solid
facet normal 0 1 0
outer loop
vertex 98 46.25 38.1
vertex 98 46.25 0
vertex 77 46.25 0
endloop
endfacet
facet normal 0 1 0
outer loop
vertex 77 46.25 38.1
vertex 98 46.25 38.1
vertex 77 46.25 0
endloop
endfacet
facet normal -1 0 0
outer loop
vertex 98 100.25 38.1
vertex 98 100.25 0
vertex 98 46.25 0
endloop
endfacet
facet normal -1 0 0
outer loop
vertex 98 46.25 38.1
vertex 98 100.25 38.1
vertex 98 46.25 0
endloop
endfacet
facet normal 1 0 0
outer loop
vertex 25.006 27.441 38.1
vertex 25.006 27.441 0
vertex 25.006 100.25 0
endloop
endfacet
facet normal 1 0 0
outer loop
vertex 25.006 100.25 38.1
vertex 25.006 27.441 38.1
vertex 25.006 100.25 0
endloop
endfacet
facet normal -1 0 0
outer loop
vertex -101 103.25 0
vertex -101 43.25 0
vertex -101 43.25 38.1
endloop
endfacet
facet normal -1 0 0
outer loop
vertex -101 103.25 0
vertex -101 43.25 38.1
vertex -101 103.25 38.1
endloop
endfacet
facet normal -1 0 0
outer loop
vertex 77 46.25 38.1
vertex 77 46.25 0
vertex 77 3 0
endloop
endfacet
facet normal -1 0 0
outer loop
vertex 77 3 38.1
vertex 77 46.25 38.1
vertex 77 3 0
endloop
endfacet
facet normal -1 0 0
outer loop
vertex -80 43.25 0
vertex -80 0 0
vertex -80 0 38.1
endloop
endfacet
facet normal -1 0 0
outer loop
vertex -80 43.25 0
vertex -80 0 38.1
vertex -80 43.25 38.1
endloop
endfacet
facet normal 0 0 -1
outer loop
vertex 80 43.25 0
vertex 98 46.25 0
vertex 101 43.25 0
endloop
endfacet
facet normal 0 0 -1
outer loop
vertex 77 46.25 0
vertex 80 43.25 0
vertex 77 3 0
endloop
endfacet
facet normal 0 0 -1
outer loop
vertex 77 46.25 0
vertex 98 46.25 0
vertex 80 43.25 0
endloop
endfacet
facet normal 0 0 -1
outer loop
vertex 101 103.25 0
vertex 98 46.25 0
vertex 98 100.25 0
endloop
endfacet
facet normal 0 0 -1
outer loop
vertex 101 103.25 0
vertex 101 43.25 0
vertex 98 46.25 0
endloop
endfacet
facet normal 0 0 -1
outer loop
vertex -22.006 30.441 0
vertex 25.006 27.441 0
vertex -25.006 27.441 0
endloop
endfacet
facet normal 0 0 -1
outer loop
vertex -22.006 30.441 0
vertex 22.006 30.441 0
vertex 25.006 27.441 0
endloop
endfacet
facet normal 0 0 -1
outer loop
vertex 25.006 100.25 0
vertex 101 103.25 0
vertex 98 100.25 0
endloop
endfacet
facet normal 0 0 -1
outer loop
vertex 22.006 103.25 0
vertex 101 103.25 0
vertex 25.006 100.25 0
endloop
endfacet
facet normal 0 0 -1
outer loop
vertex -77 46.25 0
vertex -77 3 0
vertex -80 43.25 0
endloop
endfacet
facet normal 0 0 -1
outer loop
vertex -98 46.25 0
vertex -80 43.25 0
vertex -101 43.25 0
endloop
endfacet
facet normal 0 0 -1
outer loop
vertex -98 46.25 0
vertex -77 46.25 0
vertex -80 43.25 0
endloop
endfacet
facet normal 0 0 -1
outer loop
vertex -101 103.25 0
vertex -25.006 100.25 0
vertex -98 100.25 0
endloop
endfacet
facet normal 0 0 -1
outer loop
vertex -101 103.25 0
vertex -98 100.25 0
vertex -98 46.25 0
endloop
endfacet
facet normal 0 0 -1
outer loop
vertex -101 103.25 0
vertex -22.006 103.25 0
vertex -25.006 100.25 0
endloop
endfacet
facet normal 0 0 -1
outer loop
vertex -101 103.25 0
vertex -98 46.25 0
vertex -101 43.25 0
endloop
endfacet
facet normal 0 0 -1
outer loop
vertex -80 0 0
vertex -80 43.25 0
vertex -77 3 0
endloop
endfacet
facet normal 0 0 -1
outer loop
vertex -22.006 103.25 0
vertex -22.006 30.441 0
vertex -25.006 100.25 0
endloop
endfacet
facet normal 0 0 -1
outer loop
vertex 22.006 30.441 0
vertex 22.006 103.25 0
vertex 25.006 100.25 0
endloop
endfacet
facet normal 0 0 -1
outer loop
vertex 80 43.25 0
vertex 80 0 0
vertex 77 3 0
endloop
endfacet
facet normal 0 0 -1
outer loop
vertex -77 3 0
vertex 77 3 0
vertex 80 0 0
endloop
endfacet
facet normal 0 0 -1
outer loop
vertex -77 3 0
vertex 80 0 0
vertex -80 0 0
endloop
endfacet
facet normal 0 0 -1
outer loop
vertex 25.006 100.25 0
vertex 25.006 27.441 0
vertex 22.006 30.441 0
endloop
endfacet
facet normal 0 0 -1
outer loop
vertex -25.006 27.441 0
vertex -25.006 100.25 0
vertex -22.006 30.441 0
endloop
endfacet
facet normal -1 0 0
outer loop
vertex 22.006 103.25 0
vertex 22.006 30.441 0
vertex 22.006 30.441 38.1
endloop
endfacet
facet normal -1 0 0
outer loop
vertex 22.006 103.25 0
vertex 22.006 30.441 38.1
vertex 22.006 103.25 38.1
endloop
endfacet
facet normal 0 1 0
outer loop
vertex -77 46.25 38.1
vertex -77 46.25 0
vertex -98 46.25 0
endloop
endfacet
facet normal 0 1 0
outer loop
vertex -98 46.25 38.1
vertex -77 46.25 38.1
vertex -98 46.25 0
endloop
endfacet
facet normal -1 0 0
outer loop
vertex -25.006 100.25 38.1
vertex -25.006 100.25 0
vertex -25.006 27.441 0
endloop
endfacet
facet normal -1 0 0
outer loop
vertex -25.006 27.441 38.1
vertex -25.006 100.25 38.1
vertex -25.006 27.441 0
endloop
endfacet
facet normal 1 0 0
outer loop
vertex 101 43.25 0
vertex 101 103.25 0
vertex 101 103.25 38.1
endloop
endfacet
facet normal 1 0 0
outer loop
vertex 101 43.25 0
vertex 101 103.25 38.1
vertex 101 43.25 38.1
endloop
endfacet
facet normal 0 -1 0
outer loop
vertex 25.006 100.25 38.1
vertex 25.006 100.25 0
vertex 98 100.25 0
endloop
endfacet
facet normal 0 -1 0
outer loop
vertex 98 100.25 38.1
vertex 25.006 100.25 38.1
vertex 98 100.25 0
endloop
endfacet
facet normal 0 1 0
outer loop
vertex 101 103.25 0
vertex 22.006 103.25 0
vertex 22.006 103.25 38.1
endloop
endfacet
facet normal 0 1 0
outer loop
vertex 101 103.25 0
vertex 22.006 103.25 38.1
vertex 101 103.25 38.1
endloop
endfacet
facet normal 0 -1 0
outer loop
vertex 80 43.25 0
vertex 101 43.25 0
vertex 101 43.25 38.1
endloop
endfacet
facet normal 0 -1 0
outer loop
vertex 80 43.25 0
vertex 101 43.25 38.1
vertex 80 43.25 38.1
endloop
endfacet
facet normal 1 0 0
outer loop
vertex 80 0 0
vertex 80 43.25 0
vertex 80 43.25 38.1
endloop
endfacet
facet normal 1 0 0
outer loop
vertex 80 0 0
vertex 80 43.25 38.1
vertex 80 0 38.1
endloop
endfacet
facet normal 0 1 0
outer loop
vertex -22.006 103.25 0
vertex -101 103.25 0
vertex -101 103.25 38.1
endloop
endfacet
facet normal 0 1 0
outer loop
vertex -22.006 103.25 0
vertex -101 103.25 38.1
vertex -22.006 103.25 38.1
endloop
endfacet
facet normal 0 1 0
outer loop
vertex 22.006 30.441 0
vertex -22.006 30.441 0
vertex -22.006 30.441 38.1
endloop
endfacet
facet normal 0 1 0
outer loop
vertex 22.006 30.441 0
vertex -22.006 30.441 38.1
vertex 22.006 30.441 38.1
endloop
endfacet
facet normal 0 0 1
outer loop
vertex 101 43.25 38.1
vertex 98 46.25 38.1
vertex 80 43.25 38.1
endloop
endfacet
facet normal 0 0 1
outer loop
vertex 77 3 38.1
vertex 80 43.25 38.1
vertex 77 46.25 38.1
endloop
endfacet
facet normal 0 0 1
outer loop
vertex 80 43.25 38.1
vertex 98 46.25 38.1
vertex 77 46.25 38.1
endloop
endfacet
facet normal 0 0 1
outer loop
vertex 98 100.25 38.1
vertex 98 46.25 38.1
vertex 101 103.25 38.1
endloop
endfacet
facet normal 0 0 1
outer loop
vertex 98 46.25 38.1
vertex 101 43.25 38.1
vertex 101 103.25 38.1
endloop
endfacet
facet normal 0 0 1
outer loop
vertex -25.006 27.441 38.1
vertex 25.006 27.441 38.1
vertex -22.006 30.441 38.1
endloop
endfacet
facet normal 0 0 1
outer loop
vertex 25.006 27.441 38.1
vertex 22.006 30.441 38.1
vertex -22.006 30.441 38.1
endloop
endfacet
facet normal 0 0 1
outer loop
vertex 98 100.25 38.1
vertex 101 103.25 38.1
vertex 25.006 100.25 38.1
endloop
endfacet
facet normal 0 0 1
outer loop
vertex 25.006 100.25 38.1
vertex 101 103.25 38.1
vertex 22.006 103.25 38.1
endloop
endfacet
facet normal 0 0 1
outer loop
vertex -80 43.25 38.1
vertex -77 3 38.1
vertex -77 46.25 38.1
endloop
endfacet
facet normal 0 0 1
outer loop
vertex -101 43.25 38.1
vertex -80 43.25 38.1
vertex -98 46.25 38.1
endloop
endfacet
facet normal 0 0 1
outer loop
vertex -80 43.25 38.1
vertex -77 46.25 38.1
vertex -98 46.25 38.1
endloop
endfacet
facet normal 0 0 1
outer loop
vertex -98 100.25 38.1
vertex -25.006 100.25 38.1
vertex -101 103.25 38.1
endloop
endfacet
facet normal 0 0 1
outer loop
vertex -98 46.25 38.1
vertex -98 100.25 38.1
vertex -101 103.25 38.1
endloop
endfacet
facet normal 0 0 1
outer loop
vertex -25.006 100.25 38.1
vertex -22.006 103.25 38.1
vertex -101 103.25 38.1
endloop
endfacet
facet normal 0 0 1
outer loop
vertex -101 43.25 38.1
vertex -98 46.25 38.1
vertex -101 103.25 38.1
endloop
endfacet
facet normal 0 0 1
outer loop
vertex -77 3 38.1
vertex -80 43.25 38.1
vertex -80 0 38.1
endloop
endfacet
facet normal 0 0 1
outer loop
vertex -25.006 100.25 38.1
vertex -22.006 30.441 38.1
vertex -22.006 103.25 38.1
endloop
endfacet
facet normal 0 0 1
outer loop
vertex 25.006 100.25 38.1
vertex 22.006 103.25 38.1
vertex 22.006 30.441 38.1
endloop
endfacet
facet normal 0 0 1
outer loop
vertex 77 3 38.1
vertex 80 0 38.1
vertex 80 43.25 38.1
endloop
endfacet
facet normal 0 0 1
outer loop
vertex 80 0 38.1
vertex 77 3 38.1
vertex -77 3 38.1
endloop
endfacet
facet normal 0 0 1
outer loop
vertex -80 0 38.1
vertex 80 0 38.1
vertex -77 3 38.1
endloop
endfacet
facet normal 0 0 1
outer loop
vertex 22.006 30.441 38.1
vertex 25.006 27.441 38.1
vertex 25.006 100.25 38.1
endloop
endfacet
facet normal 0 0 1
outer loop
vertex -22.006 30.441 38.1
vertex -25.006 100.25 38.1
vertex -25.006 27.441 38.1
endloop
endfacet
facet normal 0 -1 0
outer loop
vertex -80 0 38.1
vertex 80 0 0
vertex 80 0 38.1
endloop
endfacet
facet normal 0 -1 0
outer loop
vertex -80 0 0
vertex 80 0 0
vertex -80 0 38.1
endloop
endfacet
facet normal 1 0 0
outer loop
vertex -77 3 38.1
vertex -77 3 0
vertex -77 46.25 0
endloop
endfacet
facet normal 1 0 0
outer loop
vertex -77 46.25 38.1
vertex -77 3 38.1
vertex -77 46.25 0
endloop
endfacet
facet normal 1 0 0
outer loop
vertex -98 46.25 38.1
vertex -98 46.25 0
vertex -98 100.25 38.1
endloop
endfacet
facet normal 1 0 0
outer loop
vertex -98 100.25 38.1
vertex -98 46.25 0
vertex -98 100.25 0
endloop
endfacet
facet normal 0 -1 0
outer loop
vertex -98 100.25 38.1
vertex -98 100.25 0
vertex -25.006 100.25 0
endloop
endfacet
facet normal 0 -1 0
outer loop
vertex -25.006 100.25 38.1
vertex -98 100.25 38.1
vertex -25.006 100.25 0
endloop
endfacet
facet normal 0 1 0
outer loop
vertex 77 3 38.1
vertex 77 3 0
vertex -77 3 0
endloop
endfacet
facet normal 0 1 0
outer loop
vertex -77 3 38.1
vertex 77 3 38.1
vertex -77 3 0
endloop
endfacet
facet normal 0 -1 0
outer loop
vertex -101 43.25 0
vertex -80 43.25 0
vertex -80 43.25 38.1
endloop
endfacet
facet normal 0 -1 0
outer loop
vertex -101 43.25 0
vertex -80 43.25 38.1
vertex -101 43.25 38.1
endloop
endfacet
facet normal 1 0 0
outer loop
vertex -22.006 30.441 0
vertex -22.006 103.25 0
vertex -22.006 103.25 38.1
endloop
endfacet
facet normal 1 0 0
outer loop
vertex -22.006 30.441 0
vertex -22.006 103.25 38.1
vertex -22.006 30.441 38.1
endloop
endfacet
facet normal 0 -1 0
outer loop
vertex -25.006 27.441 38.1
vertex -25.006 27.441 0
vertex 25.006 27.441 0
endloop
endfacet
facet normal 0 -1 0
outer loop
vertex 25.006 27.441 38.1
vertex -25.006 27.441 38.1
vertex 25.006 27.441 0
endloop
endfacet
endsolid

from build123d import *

# Parameters (mm, degrees)
BOSS_EXTRUDE1_DEPTH = 38.1
SHELL2_T            = -3


with BuildPart() as part:
    # Sketch1 → Boss-Extrude1 (new body)
    with BuildSketch(Plane.XY):
        Polygon((80, 0), (-80, 0), (-80, 43.25), (-101, 43.25), (-101, 103.25), (-22.006, 103.25), (-22.006, 30.441483681), (22.006, 30.441483681), (22.006, 103.25), (101, 103.25), (101, 43.25), (80, 43.25), align=None)
    extrude(amount=BOSS_EXTRUDE1_DEPTH)

    # Shell2
    shell2_openings = [part.faces().sort_by_distance(p)[0] for p in [
        (0, 2.268580228, 38.1),
        (0, 2.268580228, 0),
    ]]
    offset(amount=SHELL2_T, openings=shell2_openings, kind=Kind.INTERSECTION)


solid = part.part
